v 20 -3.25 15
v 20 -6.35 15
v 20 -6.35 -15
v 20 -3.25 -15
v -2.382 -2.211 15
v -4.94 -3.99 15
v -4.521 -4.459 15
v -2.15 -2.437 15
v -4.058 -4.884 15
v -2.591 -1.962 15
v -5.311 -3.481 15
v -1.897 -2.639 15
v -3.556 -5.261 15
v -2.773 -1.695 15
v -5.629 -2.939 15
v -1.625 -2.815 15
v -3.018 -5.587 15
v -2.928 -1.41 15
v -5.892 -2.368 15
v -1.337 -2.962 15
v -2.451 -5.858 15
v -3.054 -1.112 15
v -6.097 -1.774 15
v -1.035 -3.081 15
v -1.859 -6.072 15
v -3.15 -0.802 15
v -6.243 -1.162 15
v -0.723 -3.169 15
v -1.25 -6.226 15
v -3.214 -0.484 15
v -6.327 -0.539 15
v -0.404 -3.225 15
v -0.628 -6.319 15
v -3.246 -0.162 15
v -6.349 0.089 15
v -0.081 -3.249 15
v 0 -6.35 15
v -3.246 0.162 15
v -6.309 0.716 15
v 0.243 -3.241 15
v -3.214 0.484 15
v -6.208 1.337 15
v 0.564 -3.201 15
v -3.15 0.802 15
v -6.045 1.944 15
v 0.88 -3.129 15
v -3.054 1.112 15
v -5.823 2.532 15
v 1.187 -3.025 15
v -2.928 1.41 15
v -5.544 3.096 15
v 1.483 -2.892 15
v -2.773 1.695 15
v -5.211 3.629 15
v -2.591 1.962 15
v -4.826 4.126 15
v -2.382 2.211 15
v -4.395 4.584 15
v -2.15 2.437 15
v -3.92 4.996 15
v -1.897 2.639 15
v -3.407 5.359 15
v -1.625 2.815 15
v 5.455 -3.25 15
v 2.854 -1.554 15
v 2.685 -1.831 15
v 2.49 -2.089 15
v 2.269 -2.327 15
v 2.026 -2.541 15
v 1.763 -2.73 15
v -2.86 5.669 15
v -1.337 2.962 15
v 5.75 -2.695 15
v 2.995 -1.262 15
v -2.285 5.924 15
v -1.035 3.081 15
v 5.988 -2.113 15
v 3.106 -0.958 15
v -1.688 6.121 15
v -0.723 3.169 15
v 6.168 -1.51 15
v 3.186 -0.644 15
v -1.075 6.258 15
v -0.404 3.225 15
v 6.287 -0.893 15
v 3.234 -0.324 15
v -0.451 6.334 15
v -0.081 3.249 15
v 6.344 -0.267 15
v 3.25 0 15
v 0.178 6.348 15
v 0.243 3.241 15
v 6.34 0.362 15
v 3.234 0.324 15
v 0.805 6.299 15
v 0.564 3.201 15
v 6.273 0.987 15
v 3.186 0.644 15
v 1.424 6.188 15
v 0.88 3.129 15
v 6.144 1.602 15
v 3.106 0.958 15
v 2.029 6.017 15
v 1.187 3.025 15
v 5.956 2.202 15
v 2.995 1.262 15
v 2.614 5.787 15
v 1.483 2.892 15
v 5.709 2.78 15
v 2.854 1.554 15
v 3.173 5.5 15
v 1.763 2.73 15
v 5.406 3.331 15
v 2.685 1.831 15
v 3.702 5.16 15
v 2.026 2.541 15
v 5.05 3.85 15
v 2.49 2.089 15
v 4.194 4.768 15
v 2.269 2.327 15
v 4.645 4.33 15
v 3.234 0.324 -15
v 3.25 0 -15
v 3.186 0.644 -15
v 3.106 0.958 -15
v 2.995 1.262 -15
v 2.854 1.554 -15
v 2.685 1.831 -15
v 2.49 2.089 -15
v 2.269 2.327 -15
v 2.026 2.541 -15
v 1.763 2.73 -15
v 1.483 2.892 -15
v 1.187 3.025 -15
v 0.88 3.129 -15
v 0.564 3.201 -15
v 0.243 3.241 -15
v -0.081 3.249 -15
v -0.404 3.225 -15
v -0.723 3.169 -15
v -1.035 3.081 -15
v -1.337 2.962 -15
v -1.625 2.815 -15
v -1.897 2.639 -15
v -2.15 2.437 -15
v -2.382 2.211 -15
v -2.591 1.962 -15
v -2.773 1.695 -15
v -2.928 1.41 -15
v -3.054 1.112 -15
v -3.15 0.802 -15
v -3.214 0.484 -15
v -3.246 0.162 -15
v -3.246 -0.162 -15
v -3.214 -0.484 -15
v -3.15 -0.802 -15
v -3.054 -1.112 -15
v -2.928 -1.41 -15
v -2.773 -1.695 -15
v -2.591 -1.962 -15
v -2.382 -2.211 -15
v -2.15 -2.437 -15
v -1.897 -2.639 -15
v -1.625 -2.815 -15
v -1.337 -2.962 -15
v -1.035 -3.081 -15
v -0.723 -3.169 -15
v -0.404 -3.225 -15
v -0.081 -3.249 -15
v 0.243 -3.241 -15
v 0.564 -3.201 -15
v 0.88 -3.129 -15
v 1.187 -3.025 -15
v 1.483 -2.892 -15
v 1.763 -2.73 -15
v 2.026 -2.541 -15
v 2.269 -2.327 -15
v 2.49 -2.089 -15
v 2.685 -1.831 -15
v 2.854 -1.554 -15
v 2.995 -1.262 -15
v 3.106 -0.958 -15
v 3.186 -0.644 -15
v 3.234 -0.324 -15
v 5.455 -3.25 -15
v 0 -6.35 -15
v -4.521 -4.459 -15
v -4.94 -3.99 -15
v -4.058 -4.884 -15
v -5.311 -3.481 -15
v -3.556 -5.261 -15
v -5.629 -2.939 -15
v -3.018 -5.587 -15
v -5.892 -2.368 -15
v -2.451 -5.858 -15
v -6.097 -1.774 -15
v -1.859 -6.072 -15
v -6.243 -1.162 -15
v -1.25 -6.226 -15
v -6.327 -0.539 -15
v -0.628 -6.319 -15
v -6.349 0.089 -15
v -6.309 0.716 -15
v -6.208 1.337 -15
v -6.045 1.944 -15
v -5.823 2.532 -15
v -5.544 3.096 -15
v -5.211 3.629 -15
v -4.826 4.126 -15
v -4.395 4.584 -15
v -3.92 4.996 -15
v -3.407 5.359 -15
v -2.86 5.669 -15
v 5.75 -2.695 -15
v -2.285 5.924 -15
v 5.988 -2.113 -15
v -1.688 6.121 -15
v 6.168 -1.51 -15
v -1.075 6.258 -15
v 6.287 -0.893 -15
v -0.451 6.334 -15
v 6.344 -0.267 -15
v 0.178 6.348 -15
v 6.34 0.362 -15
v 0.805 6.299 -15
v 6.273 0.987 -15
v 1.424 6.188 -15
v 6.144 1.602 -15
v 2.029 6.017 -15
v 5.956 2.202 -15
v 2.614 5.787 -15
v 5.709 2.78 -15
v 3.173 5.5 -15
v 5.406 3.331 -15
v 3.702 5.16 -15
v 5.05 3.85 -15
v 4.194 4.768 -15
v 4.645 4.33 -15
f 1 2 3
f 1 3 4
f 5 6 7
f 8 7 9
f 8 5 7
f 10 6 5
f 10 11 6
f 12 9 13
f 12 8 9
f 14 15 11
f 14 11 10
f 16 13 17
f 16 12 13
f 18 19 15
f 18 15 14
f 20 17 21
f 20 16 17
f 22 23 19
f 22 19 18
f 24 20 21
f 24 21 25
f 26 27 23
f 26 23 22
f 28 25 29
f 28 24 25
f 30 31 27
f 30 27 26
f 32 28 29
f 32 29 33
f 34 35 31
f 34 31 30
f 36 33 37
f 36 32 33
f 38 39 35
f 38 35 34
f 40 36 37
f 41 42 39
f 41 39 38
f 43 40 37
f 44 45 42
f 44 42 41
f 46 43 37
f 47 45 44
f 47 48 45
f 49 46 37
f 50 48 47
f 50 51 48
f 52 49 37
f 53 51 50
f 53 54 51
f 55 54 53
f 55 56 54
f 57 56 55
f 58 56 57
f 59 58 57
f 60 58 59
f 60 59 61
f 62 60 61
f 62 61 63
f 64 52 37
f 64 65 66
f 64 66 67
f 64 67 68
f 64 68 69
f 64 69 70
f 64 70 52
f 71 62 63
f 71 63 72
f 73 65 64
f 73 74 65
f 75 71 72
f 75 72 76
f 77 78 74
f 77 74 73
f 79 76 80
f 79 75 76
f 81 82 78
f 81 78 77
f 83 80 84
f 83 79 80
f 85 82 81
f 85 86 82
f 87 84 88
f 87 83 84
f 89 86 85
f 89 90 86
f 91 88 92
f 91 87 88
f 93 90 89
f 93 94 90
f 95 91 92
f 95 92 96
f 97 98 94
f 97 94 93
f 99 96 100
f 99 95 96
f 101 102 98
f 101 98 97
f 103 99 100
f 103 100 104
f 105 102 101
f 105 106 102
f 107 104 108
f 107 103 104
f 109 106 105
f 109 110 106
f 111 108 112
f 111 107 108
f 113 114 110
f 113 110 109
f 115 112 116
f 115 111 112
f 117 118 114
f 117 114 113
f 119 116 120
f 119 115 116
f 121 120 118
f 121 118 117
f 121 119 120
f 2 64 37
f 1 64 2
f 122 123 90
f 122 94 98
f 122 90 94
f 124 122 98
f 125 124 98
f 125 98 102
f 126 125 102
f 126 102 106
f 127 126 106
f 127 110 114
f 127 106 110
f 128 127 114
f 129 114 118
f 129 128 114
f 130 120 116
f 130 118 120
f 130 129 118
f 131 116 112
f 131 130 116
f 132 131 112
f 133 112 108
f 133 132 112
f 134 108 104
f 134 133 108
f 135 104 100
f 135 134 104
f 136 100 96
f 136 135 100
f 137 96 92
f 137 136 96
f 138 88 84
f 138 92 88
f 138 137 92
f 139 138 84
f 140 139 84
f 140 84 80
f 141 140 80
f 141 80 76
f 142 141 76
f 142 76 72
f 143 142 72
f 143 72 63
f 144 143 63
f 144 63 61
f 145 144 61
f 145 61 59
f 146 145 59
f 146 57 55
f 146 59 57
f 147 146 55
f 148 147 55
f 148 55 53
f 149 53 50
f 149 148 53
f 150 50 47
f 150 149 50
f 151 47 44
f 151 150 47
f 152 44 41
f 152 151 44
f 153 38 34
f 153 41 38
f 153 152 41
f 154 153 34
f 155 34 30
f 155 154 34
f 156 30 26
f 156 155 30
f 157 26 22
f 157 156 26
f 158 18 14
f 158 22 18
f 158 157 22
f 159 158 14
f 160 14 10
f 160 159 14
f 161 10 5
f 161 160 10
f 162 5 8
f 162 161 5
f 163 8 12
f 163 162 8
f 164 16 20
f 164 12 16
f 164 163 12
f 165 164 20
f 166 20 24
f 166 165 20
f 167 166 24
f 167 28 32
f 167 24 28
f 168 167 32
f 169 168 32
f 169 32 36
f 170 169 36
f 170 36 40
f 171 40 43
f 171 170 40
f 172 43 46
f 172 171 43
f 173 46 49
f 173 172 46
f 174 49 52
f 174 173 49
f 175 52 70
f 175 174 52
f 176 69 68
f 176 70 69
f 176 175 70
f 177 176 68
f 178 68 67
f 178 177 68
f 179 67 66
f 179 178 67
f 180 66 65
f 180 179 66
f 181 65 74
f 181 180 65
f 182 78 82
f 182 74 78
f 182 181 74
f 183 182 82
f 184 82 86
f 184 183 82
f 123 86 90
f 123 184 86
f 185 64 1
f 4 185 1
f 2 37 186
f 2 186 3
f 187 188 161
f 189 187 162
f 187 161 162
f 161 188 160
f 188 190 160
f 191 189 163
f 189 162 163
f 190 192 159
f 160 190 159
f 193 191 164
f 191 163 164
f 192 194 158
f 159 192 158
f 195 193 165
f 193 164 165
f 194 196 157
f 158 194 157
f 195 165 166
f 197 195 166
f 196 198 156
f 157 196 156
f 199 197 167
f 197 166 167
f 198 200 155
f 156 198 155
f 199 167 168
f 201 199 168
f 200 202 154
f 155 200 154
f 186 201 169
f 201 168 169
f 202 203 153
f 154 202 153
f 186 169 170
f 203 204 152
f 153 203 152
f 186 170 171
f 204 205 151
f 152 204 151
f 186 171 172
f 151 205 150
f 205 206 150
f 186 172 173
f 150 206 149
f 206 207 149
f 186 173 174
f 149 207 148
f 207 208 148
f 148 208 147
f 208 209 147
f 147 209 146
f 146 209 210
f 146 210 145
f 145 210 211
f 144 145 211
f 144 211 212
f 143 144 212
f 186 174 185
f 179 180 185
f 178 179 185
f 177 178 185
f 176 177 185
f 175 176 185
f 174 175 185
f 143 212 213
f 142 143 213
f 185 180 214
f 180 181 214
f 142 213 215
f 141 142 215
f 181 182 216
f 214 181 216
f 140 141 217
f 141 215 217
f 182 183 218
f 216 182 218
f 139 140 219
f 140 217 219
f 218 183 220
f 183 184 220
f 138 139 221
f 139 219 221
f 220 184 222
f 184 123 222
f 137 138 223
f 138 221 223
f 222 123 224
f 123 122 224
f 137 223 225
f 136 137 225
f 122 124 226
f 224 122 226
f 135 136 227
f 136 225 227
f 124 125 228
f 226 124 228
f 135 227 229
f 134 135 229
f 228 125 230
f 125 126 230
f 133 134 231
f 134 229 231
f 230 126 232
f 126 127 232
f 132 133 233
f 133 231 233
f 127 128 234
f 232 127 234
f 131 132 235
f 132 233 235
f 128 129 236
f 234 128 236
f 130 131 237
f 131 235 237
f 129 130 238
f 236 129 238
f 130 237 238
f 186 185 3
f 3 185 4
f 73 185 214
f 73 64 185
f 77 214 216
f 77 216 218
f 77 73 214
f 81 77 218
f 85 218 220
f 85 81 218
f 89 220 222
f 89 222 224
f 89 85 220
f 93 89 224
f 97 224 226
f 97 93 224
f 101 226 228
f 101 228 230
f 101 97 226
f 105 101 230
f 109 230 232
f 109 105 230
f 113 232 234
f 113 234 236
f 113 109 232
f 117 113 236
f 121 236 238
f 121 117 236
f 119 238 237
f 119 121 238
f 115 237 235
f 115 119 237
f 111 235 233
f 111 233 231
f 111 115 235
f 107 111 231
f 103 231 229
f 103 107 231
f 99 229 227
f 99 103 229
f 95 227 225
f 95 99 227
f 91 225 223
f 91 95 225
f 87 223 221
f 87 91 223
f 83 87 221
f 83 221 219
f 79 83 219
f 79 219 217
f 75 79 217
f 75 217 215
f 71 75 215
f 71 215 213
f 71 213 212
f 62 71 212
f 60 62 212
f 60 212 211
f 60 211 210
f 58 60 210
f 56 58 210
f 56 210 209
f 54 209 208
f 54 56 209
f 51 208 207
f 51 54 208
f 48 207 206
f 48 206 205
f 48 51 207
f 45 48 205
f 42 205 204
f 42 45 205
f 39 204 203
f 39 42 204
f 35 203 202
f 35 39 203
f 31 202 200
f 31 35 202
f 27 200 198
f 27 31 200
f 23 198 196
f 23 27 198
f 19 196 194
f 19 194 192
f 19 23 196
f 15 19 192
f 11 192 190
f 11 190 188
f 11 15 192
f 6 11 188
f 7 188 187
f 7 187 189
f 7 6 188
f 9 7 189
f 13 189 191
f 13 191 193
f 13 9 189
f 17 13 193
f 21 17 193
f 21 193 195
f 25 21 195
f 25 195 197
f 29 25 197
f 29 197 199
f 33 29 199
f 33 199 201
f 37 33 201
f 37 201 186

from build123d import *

# Parameters (mm, degrees)
ESBO_O1_R                = 6.35
ESBO_O1_R_2              = 3.25
RESSALTO_EXTRUS_O1_DEPTH = 15
ESBO_O2_W                = 20
ESBO_O2_H                = 3.1
RESSALTO_EXTRUS_O2_DEPTH = 30


with BuildPart() as part:
    # Esboço1 → Ressalto-extrusão1 (new, symmetric)
    with BuildSketch(Plane.XY):
        Circle(ESBO_O1_R)
        Circle(ESBO_O1_R_2, mode=Mode.SUBTRACT)
    extrude(amount=RESSALTO_EXTRUS_O1_DEPTH, both=True)

    # Esboço2 → Ressalto-extrusão2 (add)
    with BuildSketch(Plane.XY.offset(15)):
        with Locations((10, -4.8)):
            Rectangle(ESBO_O2_W, ESBO_O2_H)
    extrude(amount=-RESSALTO_EXTRUS_O2_DEPTH)


solid = part.part
